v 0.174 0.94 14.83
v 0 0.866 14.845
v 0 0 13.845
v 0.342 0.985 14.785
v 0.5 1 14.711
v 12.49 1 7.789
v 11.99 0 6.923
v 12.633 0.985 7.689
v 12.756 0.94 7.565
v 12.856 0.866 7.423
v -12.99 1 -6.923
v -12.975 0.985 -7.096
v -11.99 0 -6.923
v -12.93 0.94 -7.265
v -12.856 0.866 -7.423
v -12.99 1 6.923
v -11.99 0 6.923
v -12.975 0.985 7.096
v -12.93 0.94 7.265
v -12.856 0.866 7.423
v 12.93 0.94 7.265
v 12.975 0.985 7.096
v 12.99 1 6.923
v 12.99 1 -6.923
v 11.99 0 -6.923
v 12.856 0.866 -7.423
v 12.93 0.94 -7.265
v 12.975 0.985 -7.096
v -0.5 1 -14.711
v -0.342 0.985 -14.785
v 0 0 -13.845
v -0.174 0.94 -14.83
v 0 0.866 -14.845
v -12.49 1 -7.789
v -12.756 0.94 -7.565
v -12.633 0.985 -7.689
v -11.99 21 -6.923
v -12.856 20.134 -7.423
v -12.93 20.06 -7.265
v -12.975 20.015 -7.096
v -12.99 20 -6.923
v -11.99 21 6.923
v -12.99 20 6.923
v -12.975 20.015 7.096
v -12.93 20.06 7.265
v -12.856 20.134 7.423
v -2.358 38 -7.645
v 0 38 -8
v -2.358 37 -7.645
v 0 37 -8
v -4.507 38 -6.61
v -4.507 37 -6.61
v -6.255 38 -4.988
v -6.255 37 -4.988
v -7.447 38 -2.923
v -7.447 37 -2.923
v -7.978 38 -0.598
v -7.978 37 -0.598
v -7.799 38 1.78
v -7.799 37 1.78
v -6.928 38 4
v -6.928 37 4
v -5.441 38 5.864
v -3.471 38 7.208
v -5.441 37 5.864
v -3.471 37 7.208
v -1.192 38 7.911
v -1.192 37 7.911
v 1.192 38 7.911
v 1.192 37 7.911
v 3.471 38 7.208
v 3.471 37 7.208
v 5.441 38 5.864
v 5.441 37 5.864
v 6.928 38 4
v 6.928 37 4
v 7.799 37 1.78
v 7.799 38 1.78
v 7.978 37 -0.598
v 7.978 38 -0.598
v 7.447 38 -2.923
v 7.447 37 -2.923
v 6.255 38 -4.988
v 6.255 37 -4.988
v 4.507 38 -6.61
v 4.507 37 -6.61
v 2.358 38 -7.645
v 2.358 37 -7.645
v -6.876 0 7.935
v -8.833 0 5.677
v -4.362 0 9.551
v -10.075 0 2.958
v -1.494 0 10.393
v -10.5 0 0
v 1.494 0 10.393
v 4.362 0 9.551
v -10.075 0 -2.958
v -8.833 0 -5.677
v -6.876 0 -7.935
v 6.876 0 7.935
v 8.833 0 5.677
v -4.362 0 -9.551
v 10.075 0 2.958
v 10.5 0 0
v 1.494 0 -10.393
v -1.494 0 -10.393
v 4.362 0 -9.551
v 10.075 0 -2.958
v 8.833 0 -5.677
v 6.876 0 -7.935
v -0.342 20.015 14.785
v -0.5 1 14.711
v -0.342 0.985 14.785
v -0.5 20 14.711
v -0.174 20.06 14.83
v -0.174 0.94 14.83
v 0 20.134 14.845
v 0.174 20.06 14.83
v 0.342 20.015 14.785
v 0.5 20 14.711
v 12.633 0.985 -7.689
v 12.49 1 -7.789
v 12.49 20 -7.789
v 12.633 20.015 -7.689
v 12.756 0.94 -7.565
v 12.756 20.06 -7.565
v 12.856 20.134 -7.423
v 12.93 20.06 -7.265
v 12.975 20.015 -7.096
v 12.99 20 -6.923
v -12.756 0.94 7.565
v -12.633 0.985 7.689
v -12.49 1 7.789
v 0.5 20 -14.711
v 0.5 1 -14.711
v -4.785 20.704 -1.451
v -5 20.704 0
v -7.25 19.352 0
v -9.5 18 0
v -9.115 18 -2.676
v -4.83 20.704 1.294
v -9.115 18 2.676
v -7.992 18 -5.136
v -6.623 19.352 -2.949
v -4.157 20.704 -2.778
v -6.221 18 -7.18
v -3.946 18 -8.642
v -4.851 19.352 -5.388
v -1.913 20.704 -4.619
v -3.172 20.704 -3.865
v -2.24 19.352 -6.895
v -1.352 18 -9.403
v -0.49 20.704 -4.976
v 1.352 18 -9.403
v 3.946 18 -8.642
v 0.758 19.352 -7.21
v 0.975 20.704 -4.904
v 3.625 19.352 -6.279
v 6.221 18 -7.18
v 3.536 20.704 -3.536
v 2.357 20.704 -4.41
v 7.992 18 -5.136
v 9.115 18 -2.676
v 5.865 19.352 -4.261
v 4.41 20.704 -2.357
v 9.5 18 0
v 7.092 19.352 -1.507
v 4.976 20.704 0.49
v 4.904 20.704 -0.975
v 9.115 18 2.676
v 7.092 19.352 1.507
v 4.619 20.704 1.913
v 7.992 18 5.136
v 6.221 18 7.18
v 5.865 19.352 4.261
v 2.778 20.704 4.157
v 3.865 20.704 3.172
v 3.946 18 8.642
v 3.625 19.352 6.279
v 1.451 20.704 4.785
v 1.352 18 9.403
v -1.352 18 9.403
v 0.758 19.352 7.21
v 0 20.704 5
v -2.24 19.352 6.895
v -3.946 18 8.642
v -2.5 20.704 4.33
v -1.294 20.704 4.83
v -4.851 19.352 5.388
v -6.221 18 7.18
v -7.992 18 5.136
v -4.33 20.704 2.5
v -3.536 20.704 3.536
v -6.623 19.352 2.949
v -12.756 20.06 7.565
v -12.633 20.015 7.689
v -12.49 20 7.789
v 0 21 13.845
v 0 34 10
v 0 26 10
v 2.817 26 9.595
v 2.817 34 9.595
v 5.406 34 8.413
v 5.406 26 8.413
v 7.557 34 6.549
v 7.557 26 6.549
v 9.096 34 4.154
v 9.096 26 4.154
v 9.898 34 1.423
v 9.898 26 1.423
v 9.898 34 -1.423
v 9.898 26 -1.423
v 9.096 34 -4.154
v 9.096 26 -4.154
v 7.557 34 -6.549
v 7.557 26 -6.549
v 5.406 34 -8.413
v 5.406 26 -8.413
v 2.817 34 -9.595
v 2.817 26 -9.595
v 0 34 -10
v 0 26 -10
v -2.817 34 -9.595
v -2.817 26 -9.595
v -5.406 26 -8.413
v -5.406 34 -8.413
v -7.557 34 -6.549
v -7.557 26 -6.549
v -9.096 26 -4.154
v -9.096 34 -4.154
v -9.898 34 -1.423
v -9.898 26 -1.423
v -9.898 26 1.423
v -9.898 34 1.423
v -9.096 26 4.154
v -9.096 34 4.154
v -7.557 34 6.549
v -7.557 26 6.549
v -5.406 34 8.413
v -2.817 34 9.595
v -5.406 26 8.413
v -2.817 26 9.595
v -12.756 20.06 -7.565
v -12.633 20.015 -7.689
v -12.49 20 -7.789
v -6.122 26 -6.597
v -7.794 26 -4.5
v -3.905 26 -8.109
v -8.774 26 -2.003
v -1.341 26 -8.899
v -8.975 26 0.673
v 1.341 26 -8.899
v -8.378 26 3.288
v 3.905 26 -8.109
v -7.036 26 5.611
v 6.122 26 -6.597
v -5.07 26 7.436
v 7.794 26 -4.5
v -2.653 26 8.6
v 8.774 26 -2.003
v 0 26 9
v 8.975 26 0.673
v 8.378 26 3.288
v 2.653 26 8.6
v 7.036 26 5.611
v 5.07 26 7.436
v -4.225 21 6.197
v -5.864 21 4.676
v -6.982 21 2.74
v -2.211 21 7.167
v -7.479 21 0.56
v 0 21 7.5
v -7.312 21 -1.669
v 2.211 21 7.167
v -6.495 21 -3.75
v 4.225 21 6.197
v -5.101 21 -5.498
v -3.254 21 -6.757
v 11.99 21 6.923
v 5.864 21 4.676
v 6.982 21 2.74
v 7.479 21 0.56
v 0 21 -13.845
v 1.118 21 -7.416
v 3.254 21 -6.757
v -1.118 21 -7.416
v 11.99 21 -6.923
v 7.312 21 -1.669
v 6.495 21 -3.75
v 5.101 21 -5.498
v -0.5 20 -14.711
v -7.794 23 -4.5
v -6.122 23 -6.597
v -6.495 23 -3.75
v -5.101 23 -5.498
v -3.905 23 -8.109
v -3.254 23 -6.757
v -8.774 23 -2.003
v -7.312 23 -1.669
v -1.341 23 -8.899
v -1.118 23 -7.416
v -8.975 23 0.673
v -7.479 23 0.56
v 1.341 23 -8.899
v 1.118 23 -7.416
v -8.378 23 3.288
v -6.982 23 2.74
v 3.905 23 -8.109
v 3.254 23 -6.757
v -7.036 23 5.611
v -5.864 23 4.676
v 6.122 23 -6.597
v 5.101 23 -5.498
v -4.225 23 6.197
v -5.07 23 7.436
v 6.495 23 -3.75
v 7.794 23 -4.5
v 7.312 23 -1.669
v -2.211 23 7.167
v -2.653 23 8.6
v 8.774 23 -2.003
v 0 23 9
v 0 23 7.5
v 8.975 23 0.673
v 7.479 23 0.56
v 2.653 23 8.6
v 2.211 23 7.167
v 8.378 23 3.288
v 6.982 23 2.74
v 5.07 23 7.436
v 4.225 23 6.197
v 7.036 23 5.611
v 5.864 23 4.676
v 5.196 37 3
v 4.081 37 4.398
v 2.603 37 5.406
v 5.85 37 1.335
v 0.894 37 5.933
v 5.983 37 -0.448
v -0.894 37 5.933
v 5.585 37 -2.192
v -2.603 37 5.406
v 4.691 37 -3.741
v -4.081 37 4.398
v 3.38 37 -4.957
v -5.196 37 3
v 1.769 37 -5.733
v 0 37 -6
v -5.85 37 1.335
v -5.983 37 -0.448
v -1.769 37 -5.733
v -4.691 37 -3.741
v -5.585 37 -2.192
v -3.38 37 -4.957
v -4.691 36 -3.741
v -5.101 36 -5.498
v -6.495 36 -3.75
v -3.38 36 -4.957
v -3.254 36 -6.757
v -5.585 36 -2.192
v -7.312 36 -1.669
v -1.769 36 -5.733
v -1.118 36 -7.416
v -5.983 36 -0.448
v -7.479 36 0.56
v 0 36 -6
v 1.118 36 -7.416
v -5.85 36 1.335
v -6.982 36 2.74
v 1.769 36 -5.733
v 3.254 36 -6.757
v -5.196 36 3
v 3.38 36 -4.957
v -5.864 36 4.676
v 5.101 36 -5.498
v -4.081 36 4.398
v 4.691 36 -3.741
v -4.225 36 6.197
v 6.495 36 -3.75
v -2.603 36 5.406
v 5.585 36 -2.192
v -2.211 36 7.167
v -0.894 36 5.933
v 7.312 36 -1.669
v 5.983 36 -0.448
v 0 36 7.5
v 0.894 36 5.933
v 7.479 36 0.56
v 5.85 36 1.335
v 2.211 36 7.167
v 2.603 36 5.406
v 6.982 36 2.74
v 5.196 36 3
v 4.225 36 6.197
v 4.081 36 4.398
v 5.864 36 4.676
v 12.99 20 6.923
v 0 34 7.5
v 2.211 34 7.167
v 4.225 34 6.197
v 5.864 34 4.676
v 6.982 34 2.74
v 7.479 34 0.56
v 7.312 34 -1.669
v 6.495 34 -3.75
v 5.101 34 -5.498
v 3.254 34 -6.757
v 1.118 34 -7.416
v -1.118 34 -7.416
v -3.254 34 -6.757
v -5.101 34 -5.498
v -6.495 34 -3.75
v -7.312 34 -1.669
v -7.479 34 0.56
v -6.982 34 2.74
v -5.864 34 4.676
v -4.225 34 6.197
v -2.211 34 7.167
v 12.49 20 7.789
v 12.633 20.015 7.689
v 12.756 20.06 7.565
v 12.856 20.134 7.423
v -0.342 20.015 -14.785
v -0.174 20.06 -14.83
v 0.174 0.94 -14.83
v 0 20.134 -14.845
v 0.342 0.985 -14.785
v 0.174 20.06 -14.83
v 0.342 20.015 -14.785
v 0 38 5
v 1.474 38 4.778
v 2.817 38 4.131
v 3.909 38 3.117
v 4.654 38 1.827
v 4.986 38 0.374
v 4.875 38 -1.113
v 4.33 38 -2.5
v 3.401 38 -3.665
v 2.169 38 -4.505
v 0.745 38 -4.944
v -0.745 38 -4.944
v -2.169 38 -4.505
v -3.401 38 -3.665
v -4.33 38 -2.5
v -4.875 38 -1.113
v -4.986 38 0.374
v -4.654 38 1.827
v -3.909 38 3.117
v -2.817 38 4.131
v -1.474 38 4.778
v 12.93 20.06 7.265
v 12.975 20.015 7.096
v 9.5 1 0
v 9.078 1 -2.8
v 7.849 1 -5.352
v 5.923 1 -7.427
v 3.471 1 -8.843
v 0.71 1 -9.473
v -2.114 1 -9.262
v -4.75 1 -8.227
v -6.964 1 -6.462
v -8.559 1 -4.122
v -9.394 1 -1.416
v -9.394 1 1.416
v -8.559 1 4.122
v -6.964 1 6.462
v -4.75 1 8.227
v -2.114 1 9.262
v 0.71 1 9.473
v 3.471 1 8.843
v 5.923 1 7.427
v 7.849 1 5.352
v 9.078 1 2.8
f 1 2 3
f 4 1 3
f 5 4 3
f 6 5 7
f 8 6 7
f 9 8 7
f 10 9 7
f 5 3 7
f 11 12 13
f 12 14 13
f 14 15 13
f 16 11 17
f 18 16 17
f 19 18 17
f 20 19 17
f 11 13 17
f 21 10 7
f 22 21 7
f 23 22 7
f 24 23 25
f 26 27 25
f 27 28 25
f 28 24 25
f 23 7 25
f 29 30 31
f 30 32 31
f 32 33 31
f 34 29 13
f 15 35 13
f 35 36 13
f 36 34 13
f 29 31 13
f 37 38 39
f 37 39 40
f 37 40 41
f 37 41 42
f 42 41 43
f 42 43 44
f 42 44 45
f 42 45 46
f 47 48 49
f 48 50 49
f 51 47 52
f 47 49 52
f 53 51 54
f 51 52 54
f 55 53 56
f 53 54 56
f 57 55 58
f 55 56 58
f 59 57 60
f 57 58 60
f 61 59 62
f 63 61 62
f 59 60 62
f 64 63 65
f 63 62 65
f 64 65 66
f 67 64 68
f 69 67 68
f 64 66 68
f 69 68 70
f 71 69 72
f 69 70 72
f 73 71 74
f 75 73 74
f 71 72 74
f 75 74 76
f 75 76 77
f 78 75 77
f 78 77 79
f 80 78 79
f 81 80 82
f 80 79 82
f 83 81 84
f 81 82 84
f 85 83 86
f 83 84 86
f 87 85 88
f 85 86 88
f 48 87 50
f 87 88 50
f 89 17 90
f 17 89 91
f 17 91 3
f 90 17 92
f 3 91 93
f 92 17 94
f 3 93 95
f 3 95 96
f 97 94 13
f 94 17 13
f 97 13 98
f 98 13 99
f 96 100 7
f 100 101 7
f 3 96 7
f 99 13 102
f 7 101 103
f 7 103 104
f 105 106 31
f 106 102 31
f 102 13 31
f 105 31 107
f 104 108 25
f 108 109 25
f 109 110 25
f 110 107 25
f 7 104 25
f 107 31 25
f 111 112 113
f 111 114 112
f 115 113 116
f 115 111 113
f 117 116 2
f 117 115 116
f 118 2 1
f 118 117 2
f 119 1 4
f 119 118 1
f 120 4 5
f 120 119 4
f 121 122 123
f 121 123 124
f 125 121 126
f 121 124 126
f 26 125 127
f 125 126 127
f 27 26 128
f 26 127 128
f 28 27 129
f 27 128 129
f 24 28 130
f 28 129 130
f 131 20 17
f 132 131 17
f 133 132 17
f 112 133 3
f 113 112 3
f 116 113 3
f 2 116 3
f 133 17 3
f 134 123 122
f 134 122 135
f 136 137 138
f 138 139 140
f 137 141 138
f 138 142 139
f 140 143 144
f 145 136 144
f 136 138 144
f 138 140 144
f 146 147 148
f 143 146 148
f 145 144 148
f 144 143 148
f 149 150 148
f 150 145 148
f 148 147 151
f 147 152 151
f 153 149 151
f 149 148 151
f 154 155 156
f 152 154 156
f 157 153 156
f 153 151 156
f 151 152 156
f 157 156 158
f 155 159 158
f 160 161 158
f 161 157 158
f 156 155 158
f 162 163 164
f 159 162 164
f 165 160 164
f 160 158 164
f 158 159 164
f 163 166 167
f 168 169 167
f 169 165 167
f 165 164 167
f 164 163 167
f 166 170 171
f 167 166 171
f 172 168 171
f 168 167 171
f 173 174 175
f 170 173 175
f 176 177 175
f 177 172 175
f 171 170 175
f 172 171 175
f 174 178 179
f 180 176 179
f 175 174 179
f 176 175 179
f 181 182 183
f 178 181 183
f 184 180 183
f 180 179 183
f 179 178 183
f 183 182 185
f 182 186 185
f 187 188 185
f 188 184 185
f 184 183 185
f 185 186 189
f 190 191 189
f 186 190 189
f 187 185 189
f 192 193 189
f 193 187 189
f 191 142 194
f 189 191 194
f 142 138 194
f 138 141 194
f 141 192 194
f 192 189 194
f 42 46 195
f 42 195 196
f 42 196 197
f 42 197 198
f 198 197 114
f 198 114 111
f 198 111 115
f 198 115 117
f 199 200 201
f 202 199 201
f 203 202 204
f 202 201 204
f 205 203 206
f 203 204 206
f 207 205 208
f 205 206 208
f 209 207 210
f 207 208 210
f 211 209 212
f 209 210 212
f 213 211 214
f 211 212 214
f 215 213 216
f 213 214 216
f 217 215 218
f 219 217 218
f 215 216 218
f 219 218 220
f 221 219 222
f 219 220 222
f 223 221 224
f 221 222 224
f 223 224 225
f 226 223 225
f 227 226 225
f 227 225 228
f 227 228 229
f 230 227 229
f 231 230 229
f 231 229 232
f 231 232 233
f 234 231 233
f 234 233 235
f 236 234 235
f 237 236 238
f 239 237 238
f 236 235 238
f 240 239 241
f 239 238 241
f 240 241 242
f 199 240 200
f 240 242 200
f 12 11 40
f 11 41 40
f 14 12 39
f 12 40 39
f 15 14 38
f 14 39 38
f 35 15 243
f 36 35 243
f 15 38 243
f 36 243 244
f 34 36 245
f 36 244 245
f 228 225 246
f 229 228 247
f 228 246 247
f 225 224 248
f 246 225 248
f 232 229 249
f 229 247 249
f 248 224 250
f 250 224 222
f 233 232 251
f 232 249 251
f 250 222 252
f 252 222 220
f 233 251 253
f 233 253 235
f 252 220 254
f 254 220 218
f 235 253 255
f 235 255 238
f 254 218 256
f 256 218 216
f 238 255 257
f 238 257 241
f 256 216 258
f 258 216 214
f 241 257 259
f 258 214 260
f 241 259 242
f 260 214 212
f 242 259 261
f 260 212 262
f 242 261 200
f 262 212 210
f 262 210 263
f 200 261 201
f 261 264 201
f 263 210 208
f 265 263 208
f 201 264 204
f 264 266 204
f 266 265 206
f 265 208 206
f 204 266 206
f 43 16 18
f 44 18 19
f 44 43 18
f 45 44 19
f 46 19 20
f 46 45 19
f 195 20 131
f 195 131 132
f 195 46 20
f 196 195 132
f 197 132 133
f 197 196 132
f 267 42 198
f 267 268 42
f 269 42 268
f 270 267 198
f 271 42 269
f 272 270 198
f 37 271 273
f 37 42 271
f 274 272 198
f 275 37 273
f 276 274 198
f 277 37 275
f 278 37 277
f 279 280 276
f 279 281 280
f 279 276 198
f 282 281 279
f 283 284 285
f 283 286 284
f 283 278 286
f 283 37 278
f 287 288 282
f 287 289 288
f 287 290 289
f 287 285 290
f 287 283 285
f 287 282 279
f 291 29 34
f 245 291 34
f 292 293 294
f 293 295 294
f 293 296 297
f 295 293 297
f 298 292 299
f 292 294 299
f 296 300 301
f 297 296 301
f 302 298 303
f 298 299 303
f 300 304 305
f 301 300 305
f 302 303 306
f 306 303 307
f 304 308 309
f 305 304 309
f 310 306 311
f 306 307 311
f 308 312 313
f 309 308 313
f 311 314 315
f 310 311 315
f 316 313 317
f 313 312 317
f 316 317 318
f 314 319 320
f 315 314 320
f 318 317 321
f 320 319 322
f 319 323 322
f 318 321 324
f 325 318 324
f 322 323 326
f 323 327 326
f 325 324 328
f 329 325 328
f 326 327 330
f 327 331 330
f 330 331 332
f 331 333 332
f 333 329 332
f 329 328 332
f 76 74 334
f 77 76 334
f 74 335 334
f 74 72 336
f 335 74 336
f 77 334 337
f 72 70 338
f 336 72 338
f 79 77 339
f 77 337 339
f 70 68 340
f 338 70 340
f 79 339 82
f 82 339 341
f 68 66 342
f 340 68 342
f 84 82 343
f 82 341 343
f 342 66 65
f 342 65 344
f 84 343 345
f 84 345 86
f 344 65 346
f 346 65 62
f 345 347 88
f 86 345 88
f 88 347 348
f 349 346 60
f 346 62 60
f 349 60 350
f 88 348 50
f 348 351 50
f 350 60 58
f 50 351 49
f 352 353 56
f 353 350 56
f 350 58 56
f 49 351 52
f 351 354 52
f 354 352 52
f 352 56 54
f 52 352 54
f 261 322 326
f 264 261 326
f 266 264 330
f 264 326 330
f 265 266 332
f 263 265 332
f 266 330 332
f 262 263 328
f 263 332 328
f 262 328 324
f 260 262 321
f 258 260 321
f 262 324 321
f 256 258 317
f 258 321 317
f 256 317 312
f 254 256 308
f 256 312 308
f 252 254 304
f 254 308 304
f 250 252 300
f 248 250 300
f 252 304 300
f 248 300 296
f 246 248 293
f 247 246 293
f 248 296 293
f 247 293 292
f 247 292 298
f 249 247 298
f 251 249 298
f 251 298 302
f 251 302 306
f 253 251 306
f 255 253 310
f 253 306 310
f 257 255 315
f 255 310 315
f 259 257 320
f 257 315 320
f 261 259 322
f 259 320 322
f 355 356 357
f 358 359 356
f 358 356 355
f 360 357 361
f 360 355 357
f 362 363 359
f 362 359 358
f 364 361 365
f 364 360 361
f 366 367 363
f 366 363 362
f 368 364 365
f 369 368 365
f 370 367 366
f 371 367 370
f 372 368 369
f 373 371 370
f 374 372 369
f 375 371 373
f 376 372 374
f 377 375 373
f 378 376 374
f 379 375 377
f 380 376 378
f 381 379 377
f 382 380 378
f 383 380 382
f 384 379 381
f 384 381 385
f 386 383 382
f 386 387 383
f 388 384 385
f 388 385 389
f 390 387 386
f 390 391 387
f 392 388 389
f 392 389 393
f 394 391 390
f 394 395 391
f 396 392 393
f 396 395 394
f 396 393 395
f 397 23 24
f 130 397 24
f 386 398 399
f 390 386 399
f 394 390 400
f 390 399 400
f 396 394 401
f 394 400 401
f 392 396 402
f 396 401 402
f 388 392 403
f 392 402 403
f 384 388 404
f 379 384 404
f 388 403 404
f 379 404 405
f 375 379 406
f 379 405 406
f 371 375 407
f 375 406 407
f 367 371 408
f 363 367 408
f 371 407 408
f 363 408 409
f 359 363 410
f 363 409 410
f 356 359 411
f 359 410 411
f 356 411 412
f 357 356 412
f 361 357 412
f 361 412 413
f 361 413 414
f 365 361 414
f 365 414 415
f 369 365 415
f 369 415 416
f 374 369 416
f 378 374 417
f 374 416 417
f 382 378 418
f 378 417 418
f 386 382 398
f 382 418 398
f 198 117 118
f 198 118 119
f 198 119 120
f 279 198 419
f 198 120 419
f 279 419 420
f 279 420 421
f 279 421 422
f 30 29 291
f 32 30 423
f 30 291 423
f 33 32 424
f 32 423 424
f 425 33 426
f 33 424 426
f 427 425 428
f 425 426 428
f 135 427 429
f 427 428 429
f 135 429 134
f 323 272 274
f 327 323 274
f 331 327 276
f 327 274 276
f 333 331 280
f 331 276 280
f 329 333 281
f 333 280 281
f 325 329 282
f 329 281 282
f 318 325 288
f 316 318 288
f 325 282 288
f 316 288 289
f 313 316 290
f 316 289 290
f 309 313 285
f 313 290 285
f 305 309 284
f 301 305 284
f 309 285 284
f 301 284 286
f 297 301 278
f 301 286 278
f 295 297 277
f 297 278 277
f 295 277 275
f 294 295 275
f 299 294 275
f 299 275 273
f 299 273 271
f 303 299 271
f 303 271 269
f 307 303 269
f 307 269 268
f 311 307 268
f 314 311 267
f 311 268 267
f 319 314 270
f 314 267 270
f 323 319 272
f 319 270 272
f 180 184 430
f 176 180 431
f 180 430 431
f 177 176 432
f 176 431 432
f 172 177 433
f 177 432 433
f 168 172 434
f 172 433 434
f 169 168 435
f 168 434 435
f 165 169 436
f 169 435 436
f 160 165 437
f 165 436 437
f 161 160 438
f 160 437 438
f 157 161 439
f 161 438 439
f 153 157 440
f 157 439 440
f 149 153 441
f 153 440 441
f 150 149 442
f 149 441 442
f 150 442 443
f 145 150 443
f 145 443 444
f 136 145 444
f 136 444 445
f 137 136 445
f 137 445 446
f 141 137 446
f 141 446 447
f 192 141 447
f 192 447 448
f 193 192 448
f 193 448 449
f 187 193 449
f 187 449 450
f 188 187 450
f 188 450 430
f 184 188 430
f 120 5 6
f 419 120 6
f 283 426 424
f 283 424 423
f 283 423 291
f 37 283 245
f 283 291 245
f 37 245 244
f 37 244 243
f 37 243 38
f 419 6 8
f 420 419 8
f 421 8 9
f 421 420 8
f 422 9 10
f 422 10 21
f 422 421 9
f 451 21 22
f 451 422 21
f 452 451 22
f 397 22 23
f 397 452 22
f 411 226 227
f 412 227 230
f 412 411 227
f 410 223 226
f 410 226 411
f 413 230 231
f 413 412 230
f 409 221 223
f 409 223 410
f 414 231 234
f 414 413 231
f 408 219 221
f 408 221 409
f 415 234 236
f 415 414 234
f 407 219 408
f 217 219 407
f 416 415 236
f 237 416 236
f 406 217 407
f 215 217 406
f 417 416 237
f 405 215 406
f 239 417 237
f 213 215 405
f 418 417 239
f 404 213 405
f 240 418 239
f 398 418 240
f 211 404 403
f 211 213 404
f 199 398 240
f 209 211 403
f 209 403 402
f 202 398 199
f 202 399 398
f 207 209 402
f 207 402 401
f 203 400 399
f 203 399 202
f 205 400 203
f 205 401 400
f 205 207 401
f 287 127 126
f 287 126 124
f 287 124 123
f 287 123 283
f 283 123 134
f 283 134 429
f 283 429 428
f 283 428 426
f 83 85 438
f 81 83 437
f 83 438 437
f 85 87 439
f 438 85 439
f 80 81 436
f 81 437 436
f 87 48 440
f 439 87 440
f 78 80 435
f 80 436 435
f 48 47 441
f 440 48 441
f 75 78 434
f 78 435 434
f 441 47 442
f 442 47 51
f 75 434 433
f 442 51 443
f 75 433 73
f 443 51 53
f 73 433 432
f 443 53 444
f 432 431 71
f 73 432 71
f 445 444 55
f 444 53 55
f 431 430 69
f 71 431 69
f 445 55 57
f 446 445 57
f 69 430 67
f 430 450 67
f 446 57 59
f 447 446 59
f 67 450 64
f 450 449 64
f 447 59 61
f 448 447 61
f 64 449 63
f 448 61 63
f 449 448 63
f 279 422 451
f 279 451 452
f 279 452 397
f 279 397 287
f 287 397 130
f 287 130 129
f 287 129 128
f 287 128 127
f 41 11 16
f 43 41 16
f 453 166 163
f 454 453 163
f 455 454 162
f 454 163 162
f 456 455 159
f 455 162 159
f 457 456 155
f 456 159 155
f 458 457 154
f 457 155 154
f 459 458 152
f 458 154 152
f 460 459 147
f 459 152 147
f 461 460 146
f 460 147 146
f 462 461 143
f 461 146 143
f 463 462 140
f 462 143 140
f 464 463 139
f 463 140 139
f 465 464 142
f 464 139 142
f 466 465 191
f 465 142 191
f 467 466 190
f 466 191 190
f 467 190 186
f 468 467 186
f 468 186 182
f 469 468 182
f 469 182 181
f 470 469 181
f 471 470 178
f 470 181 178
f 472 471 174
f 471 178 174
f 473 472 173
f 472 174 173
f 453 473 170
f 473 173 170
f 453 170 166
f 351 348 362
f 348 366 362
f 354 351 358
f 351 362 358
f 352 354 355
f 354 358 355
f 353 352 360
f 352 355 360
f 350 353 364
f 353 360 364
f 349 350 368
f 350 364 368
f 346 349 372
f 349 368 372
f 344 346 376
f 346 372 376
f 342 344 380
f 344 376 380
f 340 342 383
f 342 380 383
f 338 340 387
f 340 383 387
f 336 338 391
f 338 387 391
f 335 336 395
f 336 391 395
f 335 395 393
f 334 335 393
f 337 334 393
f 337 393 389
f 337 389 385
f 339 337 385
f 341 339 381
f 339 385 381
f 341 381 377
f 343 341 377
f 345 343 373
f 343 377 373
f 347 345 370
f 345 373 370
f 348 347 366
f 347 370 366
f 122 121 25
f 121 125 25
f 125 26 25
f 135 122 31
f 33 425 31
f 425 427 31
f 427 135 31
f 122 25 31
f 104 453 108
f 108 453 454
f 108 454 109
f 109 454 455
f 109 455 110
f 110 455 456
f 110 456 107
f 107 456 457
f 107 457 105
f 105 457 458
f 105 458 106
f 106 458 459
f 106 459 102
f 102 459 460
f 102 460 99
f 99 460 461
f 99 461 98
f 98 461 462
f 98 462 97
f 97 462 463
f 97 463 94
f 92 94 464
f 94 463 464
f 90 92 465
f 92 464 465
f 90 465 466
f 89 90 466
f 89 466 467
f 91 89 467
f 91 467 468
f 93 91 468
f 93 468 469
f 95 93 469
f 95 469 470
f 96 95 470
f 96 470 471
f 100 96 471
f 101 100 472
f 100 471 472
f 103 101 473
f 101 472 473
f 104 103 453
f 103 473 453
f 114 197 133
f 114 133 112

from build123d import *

# Parameters (mm, degrees)
EXTRUDE_1_DEPTH          = 21
SKETCH_2_R               = 7.5
EXTRUDE_2_DEPTH          = 2
SKETCH_3_R               = 9
EXTRUDE_3_DEPTH          = 3
SKETCH_4_R               = 10
EXTRUDE_4_DEPTH          = 8
SKETCH_5_R               = 7.5
EXTRUDE_5_DEPTH          = 2
CUT_EXTRUDE_1_DEPTH      = 42.106568818
CUT_EXTRUDE_1_DEPTH_BACK = 42.106568818
SKETCH_7_R               = 4
HOLE_WIZARD_G1_21_D      = 19
HOLE_WIZARD_G1_21_DEPTH  = 18
HOLE_WIZARD_G1_21_TIP    = 5.708175881
CHAMFER_1_SIZE           = 1
FILLET_1_R               = 1
SKETCH_10_R              = 5
CUT_EXTRUDE_2_DEPTH      = 40


with BuildPart() as part:
    # Эскиз1 → Бобышка-Вытянуть1 (new body)
    with BuildSketch(Plane(origin=(0, 0, 0), x_dir=(1, 0, 0), z_dir=(0, 1, 0))):
        Polygon((0, 15), (-12.990381057, 7.5), (-12.990381057, -7.5), (0, -15), (12.990381057, -7.5), (12.990381057, 7.5), align=None)
    extrude(amount=EXTRUDE_1_DEPTH)

    # Эскиз2 → Бобышка-Вытянуть2 (add)
    with BuildSketch(Plane(origin=(0, 21, 0), x_dir=(1, 0, 0), z_dir=(0, 1, 0))):
        with Locations(Location((0, 0, 0), (0, 0, 270))):
            Circle(SKETCH_2_R)
    extrude(amount=EXTRUDE_2_DEPTH)

    # Эскиз3 → Бобышка-Вытянуть3 (add)
    with BuildSketch(Plane(origin=(0, 23, 0), x_dir=(1, 0, 0), z_dir=(0, 1, 0))):
        with Locations(Location((0, 0, 0), (0, 0, 270))):
            Circle(SKETCH_3_R)
    extrude(amount=EXTRUDE_3_DEPTH)

    # Эскиз4 → Бобышка-Вытянуть4 (add)
    with BuildSketch(Plane(origin=(0, 26, 0), x_dir=(1, 0, 0), z_dir=(0, 1, 0))):
        with Locations(Location((0, 0, 0), (0, 0, 270))):
            Circle(SKETCH_4_R)
    extrude(amount=EXTRUDE_4_DEPTH)

    # Эскиз5 → Бобышка-Вытянуть5 (add)
    with BuildSketch(Plane(origin=(0, 34, 0), x_dir=(1, 0, 0), z_dir=(0, 1, 0))):
        with Locations(Location((0, 0, 0), (0, 0, 270))):
            Circle(SKETCH_5_R)
    extrude(amount=EXTRUDE_5_DEPTH)

    # Эскиз6 → Повернуть1 (revolve)
    with BuildSketch(Plane.XY, mode=Mode.PRIVATE) as revolve_1_sk:
        Polygon((-8, 37), (-6, 37), (-6, 36), (-4, 36), (-4, 38), (-8, 38), align=None)
    revolve(revolve_1_sk.sketch.rotate(Axis((0, 36, 0), (0, 1, 0)), 270), axis=Axis((0, 36, 0), (0, 1, 0)))

    # Эскиз7 → Вырез-Вытянуть1 (cut, two sides: drawn at the far end of the back side and taken through both)
    with BuildSketch(Plane(origin=(0, 36, 0), x_dir=(1, 0, 0), z_dir=(0, 1, 0)).offset(-CUT_EXTRUDE_1_DEPTH_BACK)):
        with Locations(Location((0, 0, 0), (0, 0, 90))):
            Circle(SKETCH_7_R)
    extrude(amount=CUT_EXTRUDE_1_DEPTH + CUT_EXTRUDE_1_DEPTH_BACK, mode=Mode.SUBTRACT)

    # Отверстие обработанное метчиком G1/21
    with Locations(Plane(origin=(0, 0, 0), x_dir=(-1, 0, 0), z_dir=(0, -1, 0))):
        with Locations((0, 0)):
            Hole(HOLE_WIZARD_G1_21_D / 2, depth=HOLE_WIZARD_G1_21_DEPTH)
            with Locations((0, 0, -(HOLE_WIZARD_G1_21_DEPTH + HOLE_WIZARD_G1_21_TIP / 2))):  # 118° drill point
                Cone(0, HOLE_WIZARD_G1_21_D / 2, HOLE_WIZARD_G1_21_TIP, mode=Mode.SUBTRACT)

    # Фаска1
    chamfer_1_edges = [part.edges().sort_by_distance(p)[0] for p in [
        (-12.990381057, 21, 0),
        (-6.495190528, 21, 11.25),
        (6.495190528, 21, 11.25),
        (12.990381057, 21, 0),
        (6.495190528, 21, -11.25),
        (-9.5, 0, 0),
        (12.990381057, 0, 0),
        (6.495190528, 0, 11.25),
        (-6.495190528, 0, 11.25),
        (-6.495190528, 21, -11.25),
        (-12.990381057, 0, 0),
        (-6.495190528, 0, -11.25),
        (6.495190528, 0, -11.25),
    ]]
    chamfer(chamfer_1_edges, length=CHAMFER_1_SIZE)

    # Скругление1
    fillet_1_edges = [part.edges().sort_by_distance(p)[0] for p in [
        (12.990381057, 10.5, -7.5),
        (12.990381057, 10.5, 7.5),
        (0, 10.5, 15),
        (-12.990381057, 10.5, 7.5),
        (-12.990381057, 10.5, -7.5),
        (0, 10.5, -15),
    ]]
    fillet(fillet_1_edges, radius=FILLET_1_R)

    # Эскиз10 → Вырез-Вытянуть2 (cut)
    with BuildSketch(Plane(origin=(0, 38, 0), x_dir=(1, 0, 0), z_dir=(0, 1, 0))):
        with Locations(Location((0, 0, 0), (0, 0, 270))):
            Circle(SKETCH_10_R)
    extrude(amount=-CUT_EXTRUDE_2_DEPTH, mode=Mode.SUBTRACT)


solid = part.part
